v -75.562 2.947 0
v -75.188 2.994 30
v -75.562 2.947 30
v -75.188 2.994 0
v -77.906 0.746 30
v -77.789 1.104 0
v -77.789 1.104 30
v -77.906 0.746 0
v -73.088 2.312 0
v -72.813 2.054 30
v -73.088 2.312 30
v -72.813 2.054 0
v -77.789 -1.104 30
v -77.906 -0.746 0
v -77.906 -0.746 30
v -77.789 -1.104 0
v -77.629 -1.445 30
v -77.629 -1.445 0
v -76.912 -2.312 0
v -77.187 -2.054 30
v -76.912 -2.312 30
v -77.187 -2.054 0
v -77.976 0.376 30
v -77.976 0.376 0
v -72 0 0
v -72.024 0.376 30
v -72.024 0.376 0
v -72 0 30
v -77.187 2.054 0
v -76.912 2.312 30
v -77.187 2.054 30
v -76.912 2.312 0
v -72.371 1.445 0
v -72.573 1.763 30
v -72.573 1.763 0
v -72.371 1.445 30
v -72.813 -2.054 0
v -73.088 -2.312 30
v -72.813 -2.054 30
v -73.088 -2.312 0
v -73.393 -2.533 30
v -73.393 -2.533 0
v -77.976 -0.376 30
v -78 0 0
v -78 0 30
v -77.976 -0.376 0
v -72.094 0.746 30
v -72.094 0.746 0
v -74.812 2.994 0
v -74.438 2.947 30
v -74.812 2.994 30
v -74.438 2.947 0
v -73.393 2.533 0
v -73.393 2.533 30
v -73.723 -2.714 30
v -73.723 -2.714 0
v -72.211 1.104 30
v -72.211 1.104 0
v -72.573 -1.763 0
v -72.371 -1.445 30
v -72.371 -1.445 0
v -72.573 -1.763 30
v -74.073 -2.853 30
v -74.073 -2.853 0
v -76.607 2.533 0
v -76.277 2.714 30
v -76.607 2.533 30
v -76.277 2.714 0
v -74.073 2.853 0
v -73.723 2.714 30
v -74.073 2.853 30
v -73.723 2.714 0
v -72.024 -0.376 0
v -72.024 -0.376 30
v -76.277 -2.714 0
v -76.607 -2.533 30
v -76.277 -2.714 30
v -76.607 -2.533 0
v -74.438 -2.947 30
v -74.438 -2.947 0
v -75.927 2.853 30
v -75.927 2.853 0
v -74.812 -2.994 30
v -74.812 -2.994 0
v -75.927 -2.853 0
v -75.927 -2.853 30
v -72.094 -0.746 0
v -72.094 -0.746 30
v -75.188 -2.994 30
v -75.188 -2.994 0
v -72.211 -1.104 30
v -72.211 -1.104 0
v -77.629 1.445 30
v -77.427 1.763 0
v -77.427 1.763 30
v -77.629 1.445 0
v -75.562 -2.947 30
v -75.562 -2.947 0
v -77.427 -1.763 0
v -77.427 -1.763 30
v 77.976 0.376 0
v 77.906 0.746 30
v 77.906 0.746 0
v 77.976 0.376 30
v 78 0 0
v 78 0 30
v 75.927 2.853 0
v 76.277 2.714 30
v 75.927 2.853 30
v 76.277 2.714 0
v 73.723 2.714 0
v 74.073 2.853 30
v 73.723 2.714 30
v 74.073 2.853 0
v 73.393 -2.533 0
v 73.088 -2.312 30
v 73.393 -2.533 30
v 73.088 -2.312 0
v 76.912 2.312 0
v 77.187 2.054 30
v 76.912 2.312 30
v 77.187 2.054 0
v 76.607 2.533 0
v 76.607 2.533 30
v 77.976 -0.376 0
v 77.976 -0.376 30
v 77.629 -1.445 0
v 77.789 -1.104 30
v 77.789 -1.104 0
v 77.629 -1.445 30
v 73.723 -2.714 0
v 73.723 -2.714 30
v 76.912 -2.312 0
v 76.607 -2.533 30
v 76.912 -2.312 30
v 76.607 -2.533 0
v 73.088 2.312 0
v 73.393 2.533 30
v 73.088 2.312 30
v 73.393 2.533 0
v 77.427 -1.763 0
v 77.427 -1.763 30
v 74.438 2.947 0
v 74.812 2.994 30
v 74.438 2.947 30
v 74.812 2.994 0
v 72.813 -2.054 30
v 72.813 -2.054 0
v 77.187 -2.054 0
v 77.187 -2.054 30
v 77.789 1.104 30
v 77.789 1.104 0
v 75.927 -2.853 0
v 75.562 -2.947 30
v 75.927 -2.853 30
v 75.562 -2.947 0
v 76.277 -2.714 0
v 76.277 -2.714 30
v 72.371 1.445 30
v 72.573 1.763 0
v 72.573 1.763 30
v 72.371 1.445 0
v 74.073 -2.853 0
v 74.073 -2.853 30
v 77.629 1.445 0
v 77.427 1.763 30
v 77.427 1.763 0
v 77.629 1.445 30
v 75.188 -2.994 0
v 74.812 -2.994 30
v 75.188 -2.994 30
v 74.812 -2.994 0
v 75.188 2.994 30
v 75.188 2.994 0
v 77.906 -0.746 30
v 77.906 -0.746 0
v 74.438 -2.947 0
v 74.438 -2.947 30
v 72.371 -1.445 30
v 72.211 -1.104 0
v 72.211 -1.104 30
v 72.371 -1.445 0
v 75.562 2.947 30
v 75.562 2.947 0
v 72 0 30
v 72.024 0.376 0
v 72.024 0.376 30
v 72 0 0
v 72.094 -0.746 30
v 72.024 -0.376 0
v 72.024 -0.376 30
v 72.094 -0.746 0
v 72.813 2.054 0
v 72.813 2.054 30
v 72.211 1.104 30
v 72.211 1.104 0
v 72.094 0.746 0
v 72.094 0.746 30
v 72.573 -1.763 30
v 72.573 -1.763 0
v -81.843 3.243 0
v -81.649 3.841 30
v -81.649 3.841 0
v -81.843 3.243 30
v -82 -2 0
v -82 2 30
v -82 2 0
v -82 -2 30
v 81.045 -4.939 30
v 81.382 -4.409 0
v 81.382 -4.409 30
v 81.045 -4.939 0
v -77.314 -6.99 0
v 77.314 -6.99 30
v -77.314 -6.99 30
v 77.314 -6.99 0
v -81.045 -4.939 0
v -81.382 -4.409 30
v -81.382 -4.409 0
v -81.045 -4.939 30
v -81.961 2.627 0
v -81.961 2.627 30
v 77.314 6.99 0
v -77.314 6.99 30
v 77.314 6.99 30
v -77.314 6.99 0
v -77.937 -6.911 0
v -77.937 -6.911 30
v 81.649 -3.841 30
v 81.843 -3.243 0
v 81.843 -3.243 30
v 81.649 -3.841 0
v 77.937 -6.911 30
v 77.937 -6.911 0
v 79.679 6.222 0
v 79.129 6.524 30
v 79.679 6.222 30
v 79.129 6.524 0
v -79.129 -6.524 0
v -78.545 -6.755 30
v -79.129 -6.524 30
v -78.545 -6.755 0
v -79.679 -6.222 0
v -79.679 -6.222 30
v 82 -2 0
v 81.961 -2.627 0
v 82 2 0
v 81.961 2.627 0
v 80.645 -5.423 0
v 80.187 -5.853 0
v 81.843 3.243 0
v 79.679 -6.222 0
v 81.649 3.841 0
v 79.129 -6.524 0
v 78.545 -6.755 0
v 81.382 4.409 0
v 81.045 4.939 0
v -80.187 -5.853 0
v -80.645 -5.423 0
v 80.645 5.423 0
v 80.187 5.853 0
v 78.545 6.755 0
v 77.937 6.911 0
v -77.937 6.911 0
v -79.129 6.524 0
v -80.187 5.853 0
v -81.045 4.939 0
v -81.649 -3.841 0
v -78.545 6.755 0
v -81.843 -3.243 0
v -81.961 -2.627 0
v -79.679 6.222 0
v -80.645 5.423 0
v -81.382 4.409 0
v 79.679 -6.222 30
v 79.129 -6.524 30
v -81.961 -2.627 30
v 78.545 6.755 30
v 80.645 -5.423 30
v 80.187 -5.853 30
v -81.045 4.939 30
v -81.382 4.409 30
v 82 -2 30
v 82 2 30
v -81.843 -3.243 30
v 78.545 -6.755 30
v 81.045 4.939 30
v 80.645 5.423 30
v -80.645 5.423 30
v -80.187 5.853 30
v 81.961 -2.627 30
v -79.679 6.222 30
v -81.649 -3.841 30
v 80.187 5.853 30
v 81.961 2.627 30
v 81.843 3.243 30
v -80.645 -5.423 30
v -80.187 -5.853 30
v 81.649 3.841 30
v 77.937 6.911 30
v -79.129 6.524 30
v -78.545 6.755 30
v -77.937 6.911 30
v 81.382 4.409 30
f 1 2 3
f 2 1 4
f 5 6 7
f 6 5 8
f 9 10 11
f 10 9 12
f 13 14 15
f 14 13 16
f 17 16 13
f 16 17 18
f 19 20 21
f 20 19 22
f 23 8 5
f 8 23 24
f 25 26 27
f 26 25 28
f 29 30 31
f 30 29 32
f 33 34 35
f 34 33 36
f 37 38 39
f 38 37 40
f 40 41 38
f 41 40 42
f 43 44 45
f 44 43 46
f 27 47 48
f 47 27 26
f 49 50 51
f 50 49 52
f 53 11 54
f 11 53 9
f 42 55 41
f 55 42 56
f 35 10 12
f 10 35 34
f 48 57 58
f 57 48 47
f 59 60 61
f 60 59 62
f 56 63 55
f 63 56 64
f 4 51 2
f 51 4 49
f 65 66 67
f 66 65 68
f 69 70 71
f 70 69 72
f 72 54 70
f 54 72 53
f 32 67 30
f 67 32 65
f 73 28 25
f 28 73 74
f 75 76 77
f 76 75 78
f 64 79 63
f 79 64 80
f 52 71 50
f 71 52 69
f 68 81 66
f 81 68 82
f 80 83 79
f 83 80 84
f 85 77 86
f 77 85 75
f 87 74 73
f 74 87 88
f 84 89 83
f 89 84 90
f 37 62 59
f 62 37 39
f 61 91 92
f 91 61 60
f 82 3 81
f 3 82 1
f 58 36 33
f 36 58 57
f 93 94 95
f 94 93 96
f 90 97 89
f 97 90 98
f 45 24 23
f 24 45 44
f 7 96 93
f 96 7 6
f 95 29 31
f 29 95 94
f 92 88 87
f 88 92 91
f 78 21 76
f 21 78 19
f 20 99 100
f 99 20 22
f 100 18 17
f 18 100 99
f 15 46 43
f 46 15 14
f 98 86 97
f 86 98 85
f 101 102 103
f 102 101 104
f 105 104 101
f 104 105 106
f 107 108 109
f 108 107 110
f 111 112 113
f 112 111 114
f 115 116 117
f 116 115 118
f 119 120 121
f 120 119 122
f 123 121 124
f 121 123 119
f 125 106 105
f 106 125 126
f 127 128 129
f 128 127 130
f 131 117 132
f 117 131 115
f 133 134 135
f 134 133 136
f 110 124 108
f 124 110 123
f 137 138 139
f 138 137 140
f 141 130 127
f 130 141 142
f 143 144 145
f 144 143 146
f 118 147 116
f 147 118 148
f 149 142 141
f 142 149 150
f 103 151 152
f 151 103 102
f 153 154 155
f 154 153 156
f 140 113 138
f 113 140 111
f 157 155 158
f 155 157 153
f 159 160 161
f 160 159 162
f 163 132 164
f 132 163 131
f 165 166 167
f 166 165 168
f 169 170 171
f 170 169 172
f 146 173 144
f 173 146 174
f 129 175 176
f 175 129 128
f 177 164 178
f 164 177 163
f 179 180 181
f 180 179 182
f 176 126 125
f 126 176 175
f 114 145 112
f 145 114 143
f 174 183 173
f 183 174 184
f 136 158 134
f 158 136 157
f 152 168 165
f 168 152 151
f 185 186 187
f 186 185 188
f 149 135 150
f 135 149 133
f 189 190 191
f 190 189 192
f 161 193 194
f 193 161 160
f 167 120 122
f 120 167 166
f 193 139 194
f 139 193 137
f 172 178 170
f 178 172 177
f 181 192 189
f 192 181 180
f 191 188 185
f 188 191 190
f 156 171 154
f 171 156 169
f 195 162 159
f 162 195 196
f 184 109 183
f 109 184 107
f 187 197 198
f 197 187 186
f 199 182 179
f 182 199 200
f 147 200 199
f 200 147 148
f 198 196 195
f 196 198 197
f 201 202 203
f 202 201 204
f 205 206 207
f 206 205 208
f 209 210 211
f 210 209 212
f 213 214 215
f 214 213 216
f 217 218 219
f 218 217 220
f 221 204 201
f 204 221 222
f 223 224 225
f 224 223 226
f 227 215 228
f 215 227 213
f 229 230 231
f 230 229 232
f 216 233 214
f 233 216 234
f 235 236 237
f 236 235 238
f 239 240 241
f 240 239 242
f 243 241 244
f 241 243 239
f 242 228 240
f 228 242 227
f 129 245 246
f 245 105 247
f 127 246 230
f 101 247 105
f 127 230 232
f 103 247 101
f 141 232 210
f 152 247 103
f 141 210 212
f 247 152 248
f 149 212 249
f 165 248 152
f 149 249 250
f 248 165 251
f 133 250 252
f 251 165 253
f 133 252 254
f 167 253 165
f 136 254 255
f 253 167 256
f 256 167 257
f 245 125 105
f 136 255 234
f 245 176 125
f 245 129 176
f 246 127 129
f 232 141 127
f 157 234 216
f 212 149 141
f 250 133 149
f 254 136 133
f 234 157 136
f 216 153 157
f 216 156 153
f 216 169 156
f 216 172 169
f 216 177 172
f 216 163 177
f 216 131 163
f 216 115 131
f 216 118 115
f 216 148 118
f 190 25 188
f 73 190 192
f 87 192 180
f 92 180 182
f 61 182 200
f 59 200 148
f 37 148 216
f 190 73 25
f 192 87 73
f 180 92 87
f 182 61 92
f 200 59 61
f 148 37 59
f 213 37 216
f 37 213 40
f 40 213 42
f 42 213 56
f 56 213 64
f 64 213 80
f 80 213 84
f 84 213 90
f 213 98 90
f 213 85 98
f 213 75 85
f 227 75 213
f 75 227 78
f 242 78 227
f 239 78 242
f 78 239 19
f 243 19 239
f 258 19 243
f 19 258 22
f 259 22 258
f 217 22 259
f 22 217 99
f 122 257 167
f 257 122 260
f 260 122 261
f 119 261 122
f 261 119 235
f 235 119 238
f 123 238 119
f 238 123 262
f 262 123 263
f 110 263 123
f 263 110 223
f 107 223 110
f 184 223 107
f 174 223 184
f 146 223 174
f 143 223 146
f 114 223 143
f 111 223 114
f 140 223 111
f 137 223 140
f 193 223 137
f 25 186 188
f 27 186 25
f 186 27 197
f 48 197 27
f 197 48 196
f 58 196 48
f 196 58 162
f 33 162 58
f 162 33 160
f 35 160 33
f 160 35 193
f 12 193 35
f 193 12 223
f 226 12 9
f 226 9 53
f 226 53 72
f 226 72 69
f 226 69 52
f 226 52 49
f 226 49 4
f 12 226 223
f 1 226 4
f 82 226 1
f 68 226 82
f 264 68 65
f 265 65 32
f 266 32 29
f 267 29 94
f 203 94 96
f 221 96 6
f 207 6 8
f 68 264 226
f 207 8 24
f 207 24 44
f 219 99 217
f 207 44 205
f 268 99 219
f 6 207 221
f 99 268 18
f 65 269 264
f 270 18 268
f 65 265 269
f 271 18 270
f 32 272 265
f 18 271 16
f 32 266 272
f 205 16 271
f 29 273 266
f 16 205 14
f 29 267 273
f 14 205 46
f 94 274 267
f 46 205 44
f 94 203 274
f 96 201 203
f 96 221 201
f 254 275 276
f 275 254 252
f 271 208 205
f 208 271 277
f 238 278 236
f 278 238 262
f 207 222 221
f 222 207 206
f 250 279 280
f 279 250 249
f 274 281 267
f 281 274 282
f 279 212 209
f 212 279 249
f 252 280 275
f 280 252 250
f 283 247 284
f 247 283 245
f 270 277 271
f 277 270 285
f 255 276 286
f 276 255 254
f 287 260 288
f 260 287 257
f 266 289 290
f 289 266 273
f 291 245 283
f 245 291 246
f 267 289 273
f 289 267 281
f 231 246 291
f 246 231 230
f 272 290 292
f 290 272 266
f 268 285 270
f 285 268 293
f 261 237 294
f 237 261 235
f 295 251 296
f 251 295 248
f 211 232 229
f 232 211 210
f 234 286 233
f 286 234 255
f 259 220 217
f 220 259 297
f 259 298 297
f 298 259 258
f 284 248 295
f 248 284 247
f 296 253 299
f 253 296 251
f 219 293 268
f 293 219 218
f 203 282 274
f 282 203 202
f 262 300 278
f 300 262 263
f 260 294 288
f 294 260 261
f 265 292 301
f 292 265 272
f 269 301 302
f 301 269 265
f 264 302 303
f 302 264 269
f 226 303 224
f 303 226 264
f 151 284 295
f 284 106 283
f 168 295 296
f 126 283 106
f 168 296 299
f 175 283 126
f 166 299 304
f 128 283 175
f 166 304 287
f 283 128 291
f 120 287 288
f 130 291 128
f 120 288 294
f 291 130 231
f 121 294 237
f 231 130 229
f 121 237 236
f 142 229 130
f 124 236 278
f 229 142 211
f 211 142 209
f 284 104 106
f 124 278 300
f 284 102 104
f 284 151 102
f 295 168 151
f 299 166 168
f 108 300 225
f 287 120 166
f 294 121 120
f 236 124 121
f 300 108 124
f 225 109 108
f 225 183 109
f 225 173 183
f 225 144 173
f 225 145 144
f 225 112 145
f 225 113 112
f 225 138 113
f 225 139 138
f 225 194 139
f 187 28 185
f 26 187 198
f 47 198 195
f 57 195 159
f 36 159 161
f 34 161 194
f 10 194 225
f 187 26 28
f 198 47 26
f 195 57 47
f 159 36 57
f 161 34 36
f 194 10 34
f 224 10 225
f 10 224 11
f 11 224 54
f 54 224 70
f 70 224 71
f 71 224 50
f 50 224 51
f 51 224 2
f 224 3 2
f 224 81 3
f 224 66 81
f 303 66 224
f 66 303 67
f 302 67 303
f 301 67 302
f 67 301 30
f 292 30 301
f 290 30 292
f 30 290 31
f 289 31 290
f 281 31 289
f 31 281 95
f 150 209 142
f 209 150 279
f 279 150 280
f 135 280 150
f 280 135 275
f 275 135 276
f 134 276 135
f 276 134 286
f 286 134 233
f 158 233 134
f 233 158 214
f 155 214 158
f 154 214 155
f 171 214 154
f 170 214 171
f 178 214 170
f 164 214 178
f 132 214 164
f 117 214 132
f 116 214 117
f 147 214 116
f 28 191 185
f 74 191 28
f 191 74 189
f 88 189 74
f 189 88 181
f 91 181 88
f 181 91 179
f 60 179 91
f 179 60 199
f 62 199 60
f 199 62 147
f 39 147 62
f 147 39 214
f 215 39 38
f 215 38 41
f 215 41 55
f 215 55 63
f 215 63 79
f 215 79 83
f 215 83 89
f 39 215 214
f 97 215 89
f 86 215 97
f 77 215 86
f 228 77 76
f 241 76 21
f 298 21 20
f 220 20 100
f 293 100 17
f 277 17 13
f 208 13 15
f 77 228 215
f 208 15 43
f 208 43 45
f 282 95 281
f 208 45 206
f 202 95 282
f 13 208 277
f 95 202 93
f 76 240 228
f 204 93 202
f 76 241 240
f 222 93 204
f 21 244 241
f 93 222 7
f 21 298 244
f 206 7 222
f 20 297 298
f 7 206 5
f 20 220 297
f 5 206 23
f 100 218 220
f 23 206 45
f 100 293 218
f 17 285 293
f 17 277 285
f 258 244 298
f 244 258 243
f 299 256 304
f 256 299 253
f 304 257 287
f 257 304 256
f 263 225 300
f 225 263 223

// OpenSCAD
$fn = 50;


difference() {
	union() {
		hull() {
			translate(v = [-77.0000000000, 2.0000000000, 0]) {
				cylinder(h = 30, r = 5);
			}
			translate(v = [77.0000000000, 2.0000000000, 0]) {
				cylinder(h = 30, r = 5);
			}
			translate(v = [-77.0000000000, -2.0000000000, 0]) {
				cylinder(h = 30, r = 5);
			}
			translate(v = [77.0000000000, -2.0000000000, 0]) {
				cylinder(h = 30, r = 5);
			}
		}
	}
	union() {
		translate(v = [-75.0000000000, 0.0000000000, -100.0000000000]) {
			cylinder(h = 200, r = 3.0000000000);
		}
		translate(v = [-75.0000000000, 0.0000000000, -100.0000000000]) {
			cylinder(h = 200, r = 3.0000000000);
		}
		translate(v = [75.0000000000, 0.0000000000, -100.0000000000]) {
			cylinder(h = 200, r = 3.0000000000);
		}
		translate(v = [75.0000000000, 0.0000000000, -100.0000000000]) {
			cylinder(h = 200, r = 3.0000000000);
		}
	}
}
